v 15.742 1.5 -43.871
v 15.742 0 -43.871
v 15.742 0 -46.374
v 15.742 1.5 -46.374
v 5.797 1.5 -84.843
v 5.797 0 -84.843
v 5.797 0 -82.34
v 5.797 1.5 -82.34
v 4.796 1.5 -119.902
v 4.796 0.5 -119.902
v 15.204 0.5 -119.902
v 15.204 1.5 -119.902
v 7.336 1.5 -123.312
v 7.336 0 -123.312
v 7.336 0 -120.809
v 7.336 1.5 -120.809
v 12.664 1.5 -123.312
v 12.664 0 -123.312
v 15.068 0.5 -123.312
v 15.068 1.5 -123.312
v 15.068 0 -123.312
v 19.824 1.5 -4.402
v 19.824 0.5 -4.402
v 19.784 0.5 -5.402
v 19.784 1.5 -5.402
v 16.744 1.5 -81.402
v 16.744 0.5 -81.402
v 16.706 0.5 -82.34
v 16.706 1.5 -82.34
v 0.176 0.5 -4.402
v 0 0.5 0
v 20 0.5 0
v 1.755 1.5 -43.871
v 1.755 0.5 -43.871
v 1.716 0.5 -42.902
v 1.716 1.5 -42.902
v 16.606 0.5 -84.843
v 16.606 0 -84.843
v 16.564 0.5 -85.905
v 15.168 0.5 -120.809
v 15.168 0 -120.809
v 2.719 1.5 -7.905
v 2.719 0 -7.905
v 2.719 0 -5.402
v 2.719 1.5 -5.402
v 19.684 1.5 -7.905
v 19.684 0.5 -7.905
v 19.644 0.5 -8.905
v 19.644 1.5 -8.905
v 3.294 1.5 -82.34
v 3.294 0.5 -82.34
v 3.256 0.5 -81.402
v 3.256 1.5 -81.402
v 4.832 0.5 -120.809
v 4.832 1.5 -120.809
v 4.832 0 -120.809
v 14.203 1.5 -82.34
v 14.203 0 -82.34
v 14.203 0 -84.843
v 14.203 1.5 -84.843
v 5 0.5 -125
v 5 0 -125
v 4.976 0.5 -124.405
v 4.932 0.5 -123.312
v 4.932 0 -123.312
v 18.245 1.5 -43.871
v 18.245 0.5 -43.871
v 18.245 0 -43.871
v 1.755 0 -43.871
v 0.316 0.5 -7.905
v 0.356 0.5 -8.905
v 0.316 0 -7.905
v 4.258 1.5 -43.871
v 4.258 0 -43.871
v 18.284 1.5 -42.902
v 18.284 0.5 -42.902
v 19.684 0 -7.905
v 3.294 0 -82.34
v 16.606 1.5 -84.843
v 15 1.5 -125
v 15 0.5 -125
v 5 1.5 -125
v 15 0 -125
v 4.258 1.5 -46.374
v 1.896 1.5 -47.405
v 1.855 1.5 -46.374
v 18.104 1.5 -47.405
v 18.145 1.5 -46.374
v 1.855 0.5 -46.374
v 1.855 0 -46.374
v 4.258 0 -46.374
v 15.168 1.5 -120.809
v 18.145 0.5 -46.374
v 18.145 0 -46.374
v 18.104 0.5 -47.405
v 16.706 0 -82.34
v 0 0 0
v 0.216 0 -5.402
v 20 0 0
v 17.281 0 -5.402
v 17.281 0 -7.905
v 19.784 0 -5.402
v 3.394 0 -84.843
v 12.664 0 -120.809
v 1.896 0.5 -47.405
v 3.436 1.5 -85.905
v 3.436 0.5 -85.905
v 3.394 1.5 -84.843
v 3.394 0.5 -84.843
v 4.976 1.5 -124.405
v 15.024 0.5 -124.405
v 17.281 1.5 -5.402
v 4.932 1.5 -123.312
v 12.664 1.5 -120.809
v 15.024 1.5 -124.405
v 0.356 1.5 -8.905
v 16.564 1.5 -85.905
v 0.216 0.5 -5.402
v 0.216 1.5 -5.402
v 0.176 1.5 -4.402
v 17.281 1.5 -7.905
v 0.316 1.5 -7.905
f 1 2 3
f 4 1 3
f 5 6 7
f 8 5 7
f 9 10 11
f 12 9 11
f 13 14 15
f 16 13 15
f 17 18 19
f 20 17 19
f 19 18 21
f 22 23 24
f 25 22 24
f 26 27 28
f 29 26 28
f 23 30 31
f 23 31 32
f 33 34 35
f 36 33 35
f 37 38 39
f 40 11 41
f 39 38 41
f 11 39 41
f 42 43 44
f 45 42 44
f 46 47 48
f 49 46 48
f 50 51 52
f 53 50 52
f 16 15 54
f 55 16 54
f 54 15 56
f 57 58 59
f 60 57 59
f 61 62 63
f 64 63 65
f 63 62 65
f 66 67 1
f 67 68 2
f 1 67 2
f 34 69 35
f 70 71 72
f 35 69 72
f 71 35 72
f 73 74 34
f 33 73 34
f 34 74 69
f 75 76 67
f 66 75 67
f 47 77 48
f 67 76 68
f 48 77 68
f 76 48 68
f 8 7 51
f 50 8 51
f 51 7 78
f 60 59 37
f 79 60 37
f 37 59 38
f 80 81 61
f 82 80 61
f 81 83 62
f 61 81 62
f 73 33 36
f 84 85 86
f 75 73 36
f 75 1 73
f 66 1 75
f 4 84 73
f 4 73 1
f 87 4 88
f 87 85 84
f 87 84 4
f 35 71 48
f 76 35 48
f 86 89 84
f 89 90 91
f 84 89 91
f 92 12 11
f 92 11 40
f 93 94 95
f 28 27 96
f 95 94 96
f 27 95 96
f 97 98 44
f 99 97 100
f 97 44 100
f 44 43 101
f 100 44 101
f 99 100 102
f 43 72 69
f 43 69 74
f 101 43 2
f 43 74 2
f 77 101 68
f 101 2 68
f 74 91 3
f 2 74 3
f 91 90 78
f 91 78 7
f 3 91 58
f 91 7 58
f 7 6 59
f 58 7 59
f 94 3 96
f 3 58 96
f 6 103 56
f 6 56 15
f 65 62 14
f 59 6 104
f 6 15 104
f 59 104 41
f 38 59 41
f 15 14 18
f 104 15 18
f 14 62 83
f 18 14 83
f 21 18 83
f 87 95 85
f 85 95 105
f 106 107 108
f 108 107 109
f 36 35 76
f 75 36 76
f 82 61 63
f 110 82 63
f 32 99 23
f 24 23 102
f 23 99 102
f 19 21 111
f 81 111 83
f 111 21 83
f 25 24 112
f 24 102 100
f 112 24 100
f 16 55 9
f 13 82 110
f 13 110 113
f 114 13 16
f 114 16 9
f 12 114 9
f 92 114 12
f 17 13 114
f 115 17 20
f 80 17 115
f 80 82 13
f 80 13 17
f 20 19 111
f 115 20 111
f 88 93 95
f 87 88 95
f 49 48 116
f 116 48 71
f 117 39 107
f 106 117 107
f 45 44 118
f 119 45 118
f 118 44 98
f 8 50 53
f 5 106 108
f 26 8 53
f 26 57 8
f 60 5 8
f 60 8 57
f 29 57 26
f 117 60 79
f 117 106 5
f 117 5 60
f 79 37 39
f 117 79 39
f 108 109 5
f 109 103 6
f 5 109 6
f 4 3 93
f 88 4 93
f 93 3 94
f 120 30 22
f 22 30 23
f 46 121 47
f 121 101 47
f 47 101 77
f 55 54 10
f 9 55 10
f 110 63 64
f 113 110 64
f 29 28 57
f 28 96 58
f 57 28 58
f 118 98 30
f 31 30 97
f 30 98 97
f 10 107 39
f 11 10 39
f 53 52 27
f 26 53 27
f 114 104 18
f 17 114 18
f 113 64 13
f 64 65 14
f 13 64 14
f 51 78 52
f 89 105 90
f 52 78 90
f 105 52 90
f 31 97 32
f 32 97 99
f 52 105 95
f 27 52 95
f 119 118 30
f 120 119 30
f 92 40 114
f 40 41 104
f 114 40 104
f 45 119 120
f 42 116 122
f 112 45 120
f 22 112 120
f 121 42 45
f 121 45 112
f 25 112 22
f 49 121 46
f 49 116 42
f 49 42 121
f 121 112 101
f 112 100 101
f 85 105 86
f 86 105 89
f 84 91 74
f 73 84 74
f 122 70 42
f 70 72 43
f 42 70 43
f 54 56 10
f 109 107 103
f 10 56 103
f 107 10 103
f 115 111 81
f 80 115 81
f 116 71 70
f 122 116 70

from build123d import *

# Parameters (mm, degrees)
BOSS_EXTRUDE1_DEPTH = 0.5
BOSS_EXTRUDE2_DEPTH = 1


with BuildPart() as part:
    # Sketch2 → Boss-Extrude1 (new body)
    with BuildSketch(Plane(origin=(0, 0, 0), x_dir=(1, 0, 0), z_dir=(0, 1, 0))):
        Polygon((0.216060204, 5.401505112), (0, 0), (20, 0), (19.783939796, 5.401505112), (17.280808425, 5.401505112), (17.280808425, 7.904636482), (19.683814541, 7.904636482), (18.245170319, 43.870742022), (15.742038949, 43.870742022), (15.742038949, 46.373873393), (18.145045064, 46.373873393), (16.706400843, 82.339978933), (14.203269472, 82.339978933), (14.203269472, 84.843110303), (16.606275588, 84.843110303), (15.167631366, 120.809215844), (12.664499996, 120.809215844), (12.664499996, 123.312347214), (15.067506111, 123.312347214), (15, 125), (5, 125), (4.932493889, 123.312347214), (7.335500004, 123.312347214), (7.335500004, 120.809215844), (4.832368634, 120.809215844), (3.393724412, 84.843110303), (5.796730528, 84.843110303), (5.796730528, 82.339978933), (3.293599157, 82.339978933), (1.854954936, 46.373873393), (4.257961051, 46.373873393), (4.257961051, 43.870742022), (1.754829681, 43.870742022), (0.316185459, 7.904636482), (2.719191575, 7.904636482), (2.719191575, 5.401505112), align=None)
    extrude(amount=BOSS_EXTRUDE1_DEPTH)

    # Sketch3 → Boss-Extrude2 (add)
    with BuildSketch(Plane(origin=(0, 0.5, 0), x_dir=(1, 0, 0), z_dir=(0, 1, 0))):
        Polygon((0.216060204, 5.401505112), (0.176060204, 4.401505112), (19.823939796, 4.401505112), (19.783939796, 5.401505112), (17.280808425, 5.401505112), (17.280808425, 7.904636482), (19.683814541, 7.904636482), (19.643814541, 8.904636482), (0.356185459, 8.904636482), (0.316185459, 7.904636482), (2.719191575, 7.904636482), (2.719191575, 5.401505112), align=None)
        Polygon((1.754829681, 43.870742022), (1.716060204, 42.901505112), (18.283939796, 42.901505112), (18.245170319, 43.870742022), (15.742038949, 43.870742022), (15.742038949, 46.373873393), (18.145045064, 46.373873393), (18.103814541, 47.404636482), (1.896185459, 47.404636482), (1.854954936, 46.373873393), (4.257961051, 46.373873393), (4.257961051, 43.870742022), align=None)
        Polygon((3.293599157, 82.339978933), (3.256060204, 81.401505112), (16.743939796, 81.401505112), (16.706400843, 82.339978933), (14.203269472, 82.339978933), (14.203269472, 84.843110303), (16.606275588, 84.843110303), (16.563814541, 85.904636482), (3.436185459, 85.904636482), (3.393724412, 84.843110303), (5.796730528, 84.843110303), (5.796730528, 82.339978933), align=None)
        Polygon((4.832368634, 120.809215844), (4.796060204, 119.901505112), (15.203939796, 119.901505112), (15.167631366, 120.809215844), (12.664499996, 120.809215844), (12.664499996, 123.312347214), (15.067506111, 123.312347214), (15.023814541, 124.404636482), (4.976185459, 124.404636482), (4.932493889, 123.312347214), (7.335500004, 123.312347214), (7.335500004, 120.809215844), align=None)
        Polygon((5, 125), (4.976185459, 124.404636482), (15.023814541, 124.404636482), (15, 125), align=None)
    extrude(amount=BOSS_EXTRUDE2_DEPTH)


solid = part.part
